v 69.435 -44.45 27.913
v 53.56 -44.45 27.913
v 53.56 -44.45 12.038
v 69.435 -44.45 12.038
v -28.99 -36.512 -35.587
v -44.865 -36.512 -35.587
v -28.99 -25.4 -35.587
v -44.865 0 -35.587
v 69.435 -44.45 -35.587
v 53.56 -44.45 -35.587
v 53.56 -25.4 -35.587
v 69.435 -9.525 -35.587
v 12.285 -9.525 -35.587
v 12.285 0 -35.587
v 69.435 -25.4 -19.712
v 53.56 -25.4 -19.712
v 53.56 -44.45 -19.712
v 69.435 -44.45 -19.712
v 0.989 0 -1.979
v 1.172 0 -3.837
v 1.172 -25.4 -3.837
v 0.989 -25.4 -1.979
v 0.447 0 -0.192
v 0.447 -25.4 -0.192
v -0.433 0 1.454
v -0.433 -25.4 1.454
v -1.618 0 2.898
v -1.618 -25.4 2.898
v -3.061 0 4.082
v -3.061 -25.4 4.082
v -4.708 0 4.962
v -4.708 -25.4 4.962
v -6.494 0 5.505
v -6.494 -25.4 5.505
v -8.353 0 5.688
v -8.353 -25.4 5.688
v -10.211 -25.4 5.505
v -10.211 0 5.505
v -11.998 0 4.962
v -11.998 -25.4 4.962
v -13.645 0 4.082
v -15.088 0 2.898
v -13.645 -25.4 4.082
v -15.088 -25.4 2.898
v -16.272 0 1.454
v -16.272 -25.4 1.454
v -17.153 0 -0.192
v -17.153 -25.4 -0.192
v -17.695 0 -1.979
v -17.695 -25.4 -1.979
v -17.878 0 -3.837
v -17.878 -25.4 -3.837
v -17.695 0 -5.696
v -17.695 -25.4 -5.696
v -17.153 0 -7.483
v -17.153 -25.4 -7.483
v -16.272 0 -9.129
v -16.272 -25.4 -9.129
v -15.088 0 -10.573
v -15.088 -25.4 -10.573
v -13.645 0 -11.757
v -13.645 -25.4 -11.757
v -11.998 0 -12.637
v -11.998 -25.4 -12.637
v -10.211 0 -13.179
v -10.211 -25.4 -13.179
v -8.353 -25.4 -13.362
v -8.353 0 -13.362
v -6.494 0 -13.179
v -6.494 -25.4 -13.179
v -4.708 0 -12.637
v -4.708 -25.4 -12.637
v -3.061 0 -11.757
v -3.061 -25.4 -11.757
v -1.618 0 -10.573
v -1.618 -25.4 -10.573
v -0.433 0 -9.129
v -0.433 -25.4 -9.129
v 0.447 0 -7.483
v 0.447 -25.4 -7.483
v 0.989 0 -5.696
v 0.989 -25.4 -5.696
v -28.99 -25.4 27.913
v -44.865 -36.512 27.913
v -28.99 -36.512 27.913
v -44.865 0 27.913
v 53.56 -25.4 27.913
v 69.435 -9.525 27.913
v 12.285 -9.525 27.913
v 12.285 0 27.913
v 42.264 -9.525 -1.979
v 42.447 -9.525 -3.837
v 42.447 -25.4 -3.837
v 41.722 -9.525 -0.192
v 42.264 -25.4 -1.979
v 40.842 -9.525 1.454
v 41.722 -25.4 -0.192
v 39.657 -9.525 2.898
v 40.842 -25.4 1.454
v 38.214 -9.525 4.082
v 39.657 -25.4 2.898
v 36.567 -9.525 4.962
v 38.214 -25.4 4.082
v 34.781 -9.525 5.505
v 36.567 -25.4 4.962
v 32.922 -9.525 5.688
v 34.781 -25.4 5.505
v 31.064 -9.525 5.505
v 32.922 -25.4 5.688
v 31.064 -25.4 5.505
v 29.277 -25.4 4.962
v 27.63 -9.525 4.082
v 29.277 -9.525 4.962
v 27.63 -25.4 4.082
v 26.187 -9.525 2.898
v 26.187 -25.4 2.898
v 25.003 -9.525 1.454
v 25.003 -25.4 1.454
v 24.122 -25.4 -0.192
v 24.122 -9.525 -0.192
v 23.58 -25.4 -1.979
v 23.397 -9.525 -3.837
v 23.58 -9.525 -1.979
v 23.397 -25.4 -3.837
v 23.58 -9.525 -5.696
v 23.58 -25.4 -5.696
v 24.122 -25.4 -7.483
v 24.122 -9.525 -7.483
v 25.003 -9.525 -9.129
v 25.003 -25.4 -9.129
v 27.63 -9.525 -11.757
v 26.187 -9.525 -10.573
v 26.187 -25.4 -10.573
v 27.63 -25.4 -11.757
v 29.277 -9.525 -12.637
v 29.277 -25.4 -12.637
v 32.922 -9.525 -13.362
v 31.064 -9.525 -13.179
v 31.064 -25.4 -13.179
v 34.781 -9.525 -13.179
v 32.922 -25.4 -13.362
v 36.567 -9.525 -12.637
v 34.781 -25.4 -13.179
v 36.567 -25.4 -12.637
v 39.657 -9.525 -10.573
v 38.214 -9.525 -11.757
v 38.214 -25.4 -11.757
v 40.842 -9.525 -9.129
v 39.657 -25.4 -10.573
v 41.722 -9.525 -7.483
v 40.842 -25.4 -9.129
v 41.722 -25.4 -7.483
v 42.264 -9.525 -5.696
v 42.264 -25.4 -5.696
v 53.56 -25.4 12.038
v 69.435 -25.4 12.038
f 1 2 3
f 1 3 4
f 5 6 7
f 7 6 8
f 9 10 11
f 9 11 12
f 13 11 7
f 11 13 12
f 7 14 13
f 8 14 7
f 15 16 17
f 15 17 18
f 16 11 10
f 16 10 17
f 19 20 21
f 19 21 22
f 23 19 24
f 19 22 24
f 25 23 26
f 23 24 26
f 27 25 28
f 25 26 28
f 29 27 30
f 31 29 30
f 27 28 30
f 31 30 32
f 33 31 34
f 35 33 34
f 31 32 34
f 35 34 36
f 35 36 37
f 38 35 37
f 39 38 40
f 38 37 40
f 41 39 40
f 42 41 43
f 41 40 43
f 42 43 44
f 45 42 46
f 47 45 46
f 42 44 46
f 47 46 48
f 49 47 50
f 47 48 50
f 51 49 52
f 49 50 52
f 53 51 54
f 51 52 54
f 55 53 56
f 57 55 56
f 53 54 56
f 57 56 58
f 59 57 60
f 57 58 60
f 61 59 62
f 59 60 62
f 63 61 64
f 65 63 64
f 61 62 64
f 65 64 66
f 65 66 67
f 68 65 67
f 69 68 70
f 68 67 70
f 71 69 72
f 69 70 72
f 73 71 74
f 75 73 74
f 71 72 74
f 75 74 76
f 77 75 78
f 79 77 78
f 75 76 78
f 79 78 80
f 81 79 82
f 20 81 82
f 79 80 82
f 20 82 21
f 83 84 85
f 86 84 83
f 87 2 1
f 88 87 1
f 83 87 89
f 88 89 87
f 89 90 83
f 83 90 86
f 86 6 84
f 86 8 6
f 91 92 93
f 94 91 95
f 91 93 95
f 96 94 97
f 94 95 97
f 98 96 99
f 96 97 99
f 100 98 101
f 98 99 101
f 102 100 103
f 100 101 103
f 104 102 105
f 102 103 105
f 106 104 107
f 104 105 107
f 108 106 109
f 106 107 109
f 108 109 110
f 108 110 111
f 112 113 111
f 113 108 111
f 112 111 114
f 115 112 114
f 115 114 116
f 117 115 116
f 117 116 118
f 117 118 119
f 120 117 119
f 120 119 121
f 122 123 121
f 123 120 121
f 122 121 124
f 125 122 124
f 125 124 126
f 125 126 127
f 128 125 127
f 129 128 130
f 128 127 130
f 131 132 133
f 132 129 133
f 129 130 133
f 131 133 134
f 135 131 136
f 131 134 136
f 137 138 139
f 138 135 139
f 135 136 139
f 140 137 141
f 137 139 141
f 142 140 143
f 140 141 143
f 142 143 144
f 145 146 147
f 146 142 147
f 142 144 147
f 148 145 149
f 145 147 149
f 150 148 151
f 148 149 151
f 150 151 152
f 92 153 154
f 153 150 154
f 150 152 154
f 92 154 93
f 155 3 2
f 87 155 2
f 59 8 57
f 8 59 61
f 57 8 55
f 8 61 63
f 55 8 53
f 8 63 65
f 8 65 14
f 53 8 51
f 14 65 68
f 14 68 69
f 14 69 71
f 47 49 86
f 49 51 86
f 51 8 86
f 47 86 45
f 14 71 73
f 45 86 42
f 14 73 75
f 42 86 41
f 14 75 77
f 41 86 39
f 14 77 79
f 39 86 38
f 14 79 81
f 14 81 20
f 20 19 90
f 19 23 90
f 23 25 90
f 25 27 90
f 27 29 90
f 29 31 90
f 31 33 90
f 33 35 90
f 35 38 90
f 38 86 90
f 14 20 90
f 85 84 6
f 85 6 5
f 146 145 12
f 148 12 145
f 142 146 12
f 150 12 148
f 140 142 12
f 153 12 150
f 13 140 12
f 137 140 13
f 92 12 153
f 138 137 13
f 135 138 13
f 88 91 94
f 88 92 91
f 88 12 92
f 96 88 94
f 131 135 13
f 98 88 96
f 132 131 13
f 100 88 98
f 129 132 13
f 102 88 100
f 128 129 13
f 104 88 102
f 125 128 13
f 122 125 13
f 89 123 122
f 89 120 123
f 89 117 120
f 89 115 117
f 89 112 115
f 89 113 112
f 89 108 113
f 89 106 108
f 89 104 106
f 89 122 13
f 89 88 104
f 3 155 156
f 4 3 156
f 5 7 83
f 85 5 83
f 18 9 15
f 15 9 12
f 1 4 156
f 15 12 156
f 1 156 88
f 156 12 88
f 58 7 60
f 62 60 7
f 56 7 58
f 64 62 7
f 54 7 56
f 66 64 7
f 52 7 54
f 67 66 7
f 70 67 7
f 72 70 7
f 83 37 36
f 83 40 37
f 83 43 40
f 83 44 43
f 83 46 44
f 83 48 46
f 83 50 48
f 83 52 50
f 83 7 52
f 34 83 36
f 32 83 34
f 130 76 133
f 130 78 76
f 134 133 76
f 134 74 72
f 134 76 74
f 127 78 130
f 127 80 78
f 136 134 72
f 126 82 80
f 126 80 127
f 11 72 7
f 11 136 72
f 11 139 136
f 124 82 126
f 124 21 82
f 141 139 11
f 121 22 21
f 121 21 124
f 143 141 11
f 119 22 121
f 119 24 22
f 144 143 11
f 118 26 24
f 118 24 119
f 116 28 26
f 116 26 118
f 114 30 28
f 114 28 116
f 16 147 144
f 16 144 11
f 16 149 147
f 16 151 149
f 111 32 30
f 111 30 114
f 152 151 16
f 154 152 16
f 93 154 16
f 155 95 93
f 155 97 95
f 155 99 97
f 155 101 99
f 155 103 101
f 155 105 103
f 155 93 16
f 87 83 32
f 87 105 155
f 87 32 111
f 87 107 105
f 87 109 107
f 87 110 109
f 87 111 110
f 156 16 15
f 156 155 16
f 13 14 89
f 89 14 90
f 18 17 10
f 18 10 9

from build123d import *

# Parameters (mm, degrees)
F0_W      = 114.3
F0_H      = 63.5
F1_DEPTH  = 25.4
F2_W      = 15.875
F2_H      = 63.5
F3_DEPTH  = 11.1125
F4_R      = 9.525
F5_DEPTH  = 25.4
F6_R      = 9.525
F7_DEPTH  = 25.4
F8_W      = 15.875
F8_H      = 63.5
F9_DEPTH  = 19.05
F10_W     = 15.875
F10_H     = 31.75
F11_DEPTH = 19.05
F12_W     = 57.15
F12_H     = 63.5
F12_R     = 9.525
F13_DEPTH = 9.525


with BuildPart() as f1:
    # F0 (on Front) → F1 (new body)
    with BuildSketch(Plane.XZ):
        with Locations((12.284802, -3.837464)):
            Rectangle(F0_W, F0_H)
    extrude(amount=F1_DEPTH)

    # F2 (on face) → F3 (join)
    with BuildSketch(Plane.XZ.offset(25.4)):
        with Locations((-36.927698, -3.837464)):
            Rectangle(F2_W, F2_H)
    extrude(amount=F3_DEPTH)

    # F4 (on face) → F5 (cut)
    with BuildSketch(Plane.XZ.offset(25.4)):
        with Locations((-8.352698, -3.837464)):
            Circle(F4_R)
    extrude(amount=-F5_DEPTH, mode=Mode.SUBTRACT)

    # F6 (on face) → F7 (cut)
    with BuildSketch(Plane.XZ.offset(25.4)):
        with Locations((32.922302, -3.837464)):
            Circle(F6_R)
    extrude(amount=-F7_DEPTH, mode=Mode.SUBTRACT)

    # F8 (on face) → F9 (join)
    with BuildSketch(Plane.XZ.offset(25.4)):
        with Locations((61.497302, -3.837464)):
            Rectangle(F8_W, F8_H)
    extrude(amount=F9_DEPTH)

    # F10 (on face) → F11 (cut)
    with BuildSketch(Plane.XZ.offset(44.45)):
        with Locations((61.497302, -3.837464)):
            Rectangle(F10_W, F10_H)
    extrude(amount=-F11_DEPTH, mode=Mode.SUBTRACT)

    # F12 (on face) → F13 (cut)
    with BuildSketch(Plane(origin=(0, 0, 0), x_dir=(-1, 0, 0), z_dir=(0, 1, 0))):
        with Locations((-40.859802, -3.837464)):
            Rectangle(F12_W, F12_H)
        with Locations((-32.922302, -3.837464)):
            Circle(F12_R, mode=Mode.SUBTRACT)
    extrude(amount=-F13_DEPTH, mode=Mode.SUBTRACT)


solid = f1.part
